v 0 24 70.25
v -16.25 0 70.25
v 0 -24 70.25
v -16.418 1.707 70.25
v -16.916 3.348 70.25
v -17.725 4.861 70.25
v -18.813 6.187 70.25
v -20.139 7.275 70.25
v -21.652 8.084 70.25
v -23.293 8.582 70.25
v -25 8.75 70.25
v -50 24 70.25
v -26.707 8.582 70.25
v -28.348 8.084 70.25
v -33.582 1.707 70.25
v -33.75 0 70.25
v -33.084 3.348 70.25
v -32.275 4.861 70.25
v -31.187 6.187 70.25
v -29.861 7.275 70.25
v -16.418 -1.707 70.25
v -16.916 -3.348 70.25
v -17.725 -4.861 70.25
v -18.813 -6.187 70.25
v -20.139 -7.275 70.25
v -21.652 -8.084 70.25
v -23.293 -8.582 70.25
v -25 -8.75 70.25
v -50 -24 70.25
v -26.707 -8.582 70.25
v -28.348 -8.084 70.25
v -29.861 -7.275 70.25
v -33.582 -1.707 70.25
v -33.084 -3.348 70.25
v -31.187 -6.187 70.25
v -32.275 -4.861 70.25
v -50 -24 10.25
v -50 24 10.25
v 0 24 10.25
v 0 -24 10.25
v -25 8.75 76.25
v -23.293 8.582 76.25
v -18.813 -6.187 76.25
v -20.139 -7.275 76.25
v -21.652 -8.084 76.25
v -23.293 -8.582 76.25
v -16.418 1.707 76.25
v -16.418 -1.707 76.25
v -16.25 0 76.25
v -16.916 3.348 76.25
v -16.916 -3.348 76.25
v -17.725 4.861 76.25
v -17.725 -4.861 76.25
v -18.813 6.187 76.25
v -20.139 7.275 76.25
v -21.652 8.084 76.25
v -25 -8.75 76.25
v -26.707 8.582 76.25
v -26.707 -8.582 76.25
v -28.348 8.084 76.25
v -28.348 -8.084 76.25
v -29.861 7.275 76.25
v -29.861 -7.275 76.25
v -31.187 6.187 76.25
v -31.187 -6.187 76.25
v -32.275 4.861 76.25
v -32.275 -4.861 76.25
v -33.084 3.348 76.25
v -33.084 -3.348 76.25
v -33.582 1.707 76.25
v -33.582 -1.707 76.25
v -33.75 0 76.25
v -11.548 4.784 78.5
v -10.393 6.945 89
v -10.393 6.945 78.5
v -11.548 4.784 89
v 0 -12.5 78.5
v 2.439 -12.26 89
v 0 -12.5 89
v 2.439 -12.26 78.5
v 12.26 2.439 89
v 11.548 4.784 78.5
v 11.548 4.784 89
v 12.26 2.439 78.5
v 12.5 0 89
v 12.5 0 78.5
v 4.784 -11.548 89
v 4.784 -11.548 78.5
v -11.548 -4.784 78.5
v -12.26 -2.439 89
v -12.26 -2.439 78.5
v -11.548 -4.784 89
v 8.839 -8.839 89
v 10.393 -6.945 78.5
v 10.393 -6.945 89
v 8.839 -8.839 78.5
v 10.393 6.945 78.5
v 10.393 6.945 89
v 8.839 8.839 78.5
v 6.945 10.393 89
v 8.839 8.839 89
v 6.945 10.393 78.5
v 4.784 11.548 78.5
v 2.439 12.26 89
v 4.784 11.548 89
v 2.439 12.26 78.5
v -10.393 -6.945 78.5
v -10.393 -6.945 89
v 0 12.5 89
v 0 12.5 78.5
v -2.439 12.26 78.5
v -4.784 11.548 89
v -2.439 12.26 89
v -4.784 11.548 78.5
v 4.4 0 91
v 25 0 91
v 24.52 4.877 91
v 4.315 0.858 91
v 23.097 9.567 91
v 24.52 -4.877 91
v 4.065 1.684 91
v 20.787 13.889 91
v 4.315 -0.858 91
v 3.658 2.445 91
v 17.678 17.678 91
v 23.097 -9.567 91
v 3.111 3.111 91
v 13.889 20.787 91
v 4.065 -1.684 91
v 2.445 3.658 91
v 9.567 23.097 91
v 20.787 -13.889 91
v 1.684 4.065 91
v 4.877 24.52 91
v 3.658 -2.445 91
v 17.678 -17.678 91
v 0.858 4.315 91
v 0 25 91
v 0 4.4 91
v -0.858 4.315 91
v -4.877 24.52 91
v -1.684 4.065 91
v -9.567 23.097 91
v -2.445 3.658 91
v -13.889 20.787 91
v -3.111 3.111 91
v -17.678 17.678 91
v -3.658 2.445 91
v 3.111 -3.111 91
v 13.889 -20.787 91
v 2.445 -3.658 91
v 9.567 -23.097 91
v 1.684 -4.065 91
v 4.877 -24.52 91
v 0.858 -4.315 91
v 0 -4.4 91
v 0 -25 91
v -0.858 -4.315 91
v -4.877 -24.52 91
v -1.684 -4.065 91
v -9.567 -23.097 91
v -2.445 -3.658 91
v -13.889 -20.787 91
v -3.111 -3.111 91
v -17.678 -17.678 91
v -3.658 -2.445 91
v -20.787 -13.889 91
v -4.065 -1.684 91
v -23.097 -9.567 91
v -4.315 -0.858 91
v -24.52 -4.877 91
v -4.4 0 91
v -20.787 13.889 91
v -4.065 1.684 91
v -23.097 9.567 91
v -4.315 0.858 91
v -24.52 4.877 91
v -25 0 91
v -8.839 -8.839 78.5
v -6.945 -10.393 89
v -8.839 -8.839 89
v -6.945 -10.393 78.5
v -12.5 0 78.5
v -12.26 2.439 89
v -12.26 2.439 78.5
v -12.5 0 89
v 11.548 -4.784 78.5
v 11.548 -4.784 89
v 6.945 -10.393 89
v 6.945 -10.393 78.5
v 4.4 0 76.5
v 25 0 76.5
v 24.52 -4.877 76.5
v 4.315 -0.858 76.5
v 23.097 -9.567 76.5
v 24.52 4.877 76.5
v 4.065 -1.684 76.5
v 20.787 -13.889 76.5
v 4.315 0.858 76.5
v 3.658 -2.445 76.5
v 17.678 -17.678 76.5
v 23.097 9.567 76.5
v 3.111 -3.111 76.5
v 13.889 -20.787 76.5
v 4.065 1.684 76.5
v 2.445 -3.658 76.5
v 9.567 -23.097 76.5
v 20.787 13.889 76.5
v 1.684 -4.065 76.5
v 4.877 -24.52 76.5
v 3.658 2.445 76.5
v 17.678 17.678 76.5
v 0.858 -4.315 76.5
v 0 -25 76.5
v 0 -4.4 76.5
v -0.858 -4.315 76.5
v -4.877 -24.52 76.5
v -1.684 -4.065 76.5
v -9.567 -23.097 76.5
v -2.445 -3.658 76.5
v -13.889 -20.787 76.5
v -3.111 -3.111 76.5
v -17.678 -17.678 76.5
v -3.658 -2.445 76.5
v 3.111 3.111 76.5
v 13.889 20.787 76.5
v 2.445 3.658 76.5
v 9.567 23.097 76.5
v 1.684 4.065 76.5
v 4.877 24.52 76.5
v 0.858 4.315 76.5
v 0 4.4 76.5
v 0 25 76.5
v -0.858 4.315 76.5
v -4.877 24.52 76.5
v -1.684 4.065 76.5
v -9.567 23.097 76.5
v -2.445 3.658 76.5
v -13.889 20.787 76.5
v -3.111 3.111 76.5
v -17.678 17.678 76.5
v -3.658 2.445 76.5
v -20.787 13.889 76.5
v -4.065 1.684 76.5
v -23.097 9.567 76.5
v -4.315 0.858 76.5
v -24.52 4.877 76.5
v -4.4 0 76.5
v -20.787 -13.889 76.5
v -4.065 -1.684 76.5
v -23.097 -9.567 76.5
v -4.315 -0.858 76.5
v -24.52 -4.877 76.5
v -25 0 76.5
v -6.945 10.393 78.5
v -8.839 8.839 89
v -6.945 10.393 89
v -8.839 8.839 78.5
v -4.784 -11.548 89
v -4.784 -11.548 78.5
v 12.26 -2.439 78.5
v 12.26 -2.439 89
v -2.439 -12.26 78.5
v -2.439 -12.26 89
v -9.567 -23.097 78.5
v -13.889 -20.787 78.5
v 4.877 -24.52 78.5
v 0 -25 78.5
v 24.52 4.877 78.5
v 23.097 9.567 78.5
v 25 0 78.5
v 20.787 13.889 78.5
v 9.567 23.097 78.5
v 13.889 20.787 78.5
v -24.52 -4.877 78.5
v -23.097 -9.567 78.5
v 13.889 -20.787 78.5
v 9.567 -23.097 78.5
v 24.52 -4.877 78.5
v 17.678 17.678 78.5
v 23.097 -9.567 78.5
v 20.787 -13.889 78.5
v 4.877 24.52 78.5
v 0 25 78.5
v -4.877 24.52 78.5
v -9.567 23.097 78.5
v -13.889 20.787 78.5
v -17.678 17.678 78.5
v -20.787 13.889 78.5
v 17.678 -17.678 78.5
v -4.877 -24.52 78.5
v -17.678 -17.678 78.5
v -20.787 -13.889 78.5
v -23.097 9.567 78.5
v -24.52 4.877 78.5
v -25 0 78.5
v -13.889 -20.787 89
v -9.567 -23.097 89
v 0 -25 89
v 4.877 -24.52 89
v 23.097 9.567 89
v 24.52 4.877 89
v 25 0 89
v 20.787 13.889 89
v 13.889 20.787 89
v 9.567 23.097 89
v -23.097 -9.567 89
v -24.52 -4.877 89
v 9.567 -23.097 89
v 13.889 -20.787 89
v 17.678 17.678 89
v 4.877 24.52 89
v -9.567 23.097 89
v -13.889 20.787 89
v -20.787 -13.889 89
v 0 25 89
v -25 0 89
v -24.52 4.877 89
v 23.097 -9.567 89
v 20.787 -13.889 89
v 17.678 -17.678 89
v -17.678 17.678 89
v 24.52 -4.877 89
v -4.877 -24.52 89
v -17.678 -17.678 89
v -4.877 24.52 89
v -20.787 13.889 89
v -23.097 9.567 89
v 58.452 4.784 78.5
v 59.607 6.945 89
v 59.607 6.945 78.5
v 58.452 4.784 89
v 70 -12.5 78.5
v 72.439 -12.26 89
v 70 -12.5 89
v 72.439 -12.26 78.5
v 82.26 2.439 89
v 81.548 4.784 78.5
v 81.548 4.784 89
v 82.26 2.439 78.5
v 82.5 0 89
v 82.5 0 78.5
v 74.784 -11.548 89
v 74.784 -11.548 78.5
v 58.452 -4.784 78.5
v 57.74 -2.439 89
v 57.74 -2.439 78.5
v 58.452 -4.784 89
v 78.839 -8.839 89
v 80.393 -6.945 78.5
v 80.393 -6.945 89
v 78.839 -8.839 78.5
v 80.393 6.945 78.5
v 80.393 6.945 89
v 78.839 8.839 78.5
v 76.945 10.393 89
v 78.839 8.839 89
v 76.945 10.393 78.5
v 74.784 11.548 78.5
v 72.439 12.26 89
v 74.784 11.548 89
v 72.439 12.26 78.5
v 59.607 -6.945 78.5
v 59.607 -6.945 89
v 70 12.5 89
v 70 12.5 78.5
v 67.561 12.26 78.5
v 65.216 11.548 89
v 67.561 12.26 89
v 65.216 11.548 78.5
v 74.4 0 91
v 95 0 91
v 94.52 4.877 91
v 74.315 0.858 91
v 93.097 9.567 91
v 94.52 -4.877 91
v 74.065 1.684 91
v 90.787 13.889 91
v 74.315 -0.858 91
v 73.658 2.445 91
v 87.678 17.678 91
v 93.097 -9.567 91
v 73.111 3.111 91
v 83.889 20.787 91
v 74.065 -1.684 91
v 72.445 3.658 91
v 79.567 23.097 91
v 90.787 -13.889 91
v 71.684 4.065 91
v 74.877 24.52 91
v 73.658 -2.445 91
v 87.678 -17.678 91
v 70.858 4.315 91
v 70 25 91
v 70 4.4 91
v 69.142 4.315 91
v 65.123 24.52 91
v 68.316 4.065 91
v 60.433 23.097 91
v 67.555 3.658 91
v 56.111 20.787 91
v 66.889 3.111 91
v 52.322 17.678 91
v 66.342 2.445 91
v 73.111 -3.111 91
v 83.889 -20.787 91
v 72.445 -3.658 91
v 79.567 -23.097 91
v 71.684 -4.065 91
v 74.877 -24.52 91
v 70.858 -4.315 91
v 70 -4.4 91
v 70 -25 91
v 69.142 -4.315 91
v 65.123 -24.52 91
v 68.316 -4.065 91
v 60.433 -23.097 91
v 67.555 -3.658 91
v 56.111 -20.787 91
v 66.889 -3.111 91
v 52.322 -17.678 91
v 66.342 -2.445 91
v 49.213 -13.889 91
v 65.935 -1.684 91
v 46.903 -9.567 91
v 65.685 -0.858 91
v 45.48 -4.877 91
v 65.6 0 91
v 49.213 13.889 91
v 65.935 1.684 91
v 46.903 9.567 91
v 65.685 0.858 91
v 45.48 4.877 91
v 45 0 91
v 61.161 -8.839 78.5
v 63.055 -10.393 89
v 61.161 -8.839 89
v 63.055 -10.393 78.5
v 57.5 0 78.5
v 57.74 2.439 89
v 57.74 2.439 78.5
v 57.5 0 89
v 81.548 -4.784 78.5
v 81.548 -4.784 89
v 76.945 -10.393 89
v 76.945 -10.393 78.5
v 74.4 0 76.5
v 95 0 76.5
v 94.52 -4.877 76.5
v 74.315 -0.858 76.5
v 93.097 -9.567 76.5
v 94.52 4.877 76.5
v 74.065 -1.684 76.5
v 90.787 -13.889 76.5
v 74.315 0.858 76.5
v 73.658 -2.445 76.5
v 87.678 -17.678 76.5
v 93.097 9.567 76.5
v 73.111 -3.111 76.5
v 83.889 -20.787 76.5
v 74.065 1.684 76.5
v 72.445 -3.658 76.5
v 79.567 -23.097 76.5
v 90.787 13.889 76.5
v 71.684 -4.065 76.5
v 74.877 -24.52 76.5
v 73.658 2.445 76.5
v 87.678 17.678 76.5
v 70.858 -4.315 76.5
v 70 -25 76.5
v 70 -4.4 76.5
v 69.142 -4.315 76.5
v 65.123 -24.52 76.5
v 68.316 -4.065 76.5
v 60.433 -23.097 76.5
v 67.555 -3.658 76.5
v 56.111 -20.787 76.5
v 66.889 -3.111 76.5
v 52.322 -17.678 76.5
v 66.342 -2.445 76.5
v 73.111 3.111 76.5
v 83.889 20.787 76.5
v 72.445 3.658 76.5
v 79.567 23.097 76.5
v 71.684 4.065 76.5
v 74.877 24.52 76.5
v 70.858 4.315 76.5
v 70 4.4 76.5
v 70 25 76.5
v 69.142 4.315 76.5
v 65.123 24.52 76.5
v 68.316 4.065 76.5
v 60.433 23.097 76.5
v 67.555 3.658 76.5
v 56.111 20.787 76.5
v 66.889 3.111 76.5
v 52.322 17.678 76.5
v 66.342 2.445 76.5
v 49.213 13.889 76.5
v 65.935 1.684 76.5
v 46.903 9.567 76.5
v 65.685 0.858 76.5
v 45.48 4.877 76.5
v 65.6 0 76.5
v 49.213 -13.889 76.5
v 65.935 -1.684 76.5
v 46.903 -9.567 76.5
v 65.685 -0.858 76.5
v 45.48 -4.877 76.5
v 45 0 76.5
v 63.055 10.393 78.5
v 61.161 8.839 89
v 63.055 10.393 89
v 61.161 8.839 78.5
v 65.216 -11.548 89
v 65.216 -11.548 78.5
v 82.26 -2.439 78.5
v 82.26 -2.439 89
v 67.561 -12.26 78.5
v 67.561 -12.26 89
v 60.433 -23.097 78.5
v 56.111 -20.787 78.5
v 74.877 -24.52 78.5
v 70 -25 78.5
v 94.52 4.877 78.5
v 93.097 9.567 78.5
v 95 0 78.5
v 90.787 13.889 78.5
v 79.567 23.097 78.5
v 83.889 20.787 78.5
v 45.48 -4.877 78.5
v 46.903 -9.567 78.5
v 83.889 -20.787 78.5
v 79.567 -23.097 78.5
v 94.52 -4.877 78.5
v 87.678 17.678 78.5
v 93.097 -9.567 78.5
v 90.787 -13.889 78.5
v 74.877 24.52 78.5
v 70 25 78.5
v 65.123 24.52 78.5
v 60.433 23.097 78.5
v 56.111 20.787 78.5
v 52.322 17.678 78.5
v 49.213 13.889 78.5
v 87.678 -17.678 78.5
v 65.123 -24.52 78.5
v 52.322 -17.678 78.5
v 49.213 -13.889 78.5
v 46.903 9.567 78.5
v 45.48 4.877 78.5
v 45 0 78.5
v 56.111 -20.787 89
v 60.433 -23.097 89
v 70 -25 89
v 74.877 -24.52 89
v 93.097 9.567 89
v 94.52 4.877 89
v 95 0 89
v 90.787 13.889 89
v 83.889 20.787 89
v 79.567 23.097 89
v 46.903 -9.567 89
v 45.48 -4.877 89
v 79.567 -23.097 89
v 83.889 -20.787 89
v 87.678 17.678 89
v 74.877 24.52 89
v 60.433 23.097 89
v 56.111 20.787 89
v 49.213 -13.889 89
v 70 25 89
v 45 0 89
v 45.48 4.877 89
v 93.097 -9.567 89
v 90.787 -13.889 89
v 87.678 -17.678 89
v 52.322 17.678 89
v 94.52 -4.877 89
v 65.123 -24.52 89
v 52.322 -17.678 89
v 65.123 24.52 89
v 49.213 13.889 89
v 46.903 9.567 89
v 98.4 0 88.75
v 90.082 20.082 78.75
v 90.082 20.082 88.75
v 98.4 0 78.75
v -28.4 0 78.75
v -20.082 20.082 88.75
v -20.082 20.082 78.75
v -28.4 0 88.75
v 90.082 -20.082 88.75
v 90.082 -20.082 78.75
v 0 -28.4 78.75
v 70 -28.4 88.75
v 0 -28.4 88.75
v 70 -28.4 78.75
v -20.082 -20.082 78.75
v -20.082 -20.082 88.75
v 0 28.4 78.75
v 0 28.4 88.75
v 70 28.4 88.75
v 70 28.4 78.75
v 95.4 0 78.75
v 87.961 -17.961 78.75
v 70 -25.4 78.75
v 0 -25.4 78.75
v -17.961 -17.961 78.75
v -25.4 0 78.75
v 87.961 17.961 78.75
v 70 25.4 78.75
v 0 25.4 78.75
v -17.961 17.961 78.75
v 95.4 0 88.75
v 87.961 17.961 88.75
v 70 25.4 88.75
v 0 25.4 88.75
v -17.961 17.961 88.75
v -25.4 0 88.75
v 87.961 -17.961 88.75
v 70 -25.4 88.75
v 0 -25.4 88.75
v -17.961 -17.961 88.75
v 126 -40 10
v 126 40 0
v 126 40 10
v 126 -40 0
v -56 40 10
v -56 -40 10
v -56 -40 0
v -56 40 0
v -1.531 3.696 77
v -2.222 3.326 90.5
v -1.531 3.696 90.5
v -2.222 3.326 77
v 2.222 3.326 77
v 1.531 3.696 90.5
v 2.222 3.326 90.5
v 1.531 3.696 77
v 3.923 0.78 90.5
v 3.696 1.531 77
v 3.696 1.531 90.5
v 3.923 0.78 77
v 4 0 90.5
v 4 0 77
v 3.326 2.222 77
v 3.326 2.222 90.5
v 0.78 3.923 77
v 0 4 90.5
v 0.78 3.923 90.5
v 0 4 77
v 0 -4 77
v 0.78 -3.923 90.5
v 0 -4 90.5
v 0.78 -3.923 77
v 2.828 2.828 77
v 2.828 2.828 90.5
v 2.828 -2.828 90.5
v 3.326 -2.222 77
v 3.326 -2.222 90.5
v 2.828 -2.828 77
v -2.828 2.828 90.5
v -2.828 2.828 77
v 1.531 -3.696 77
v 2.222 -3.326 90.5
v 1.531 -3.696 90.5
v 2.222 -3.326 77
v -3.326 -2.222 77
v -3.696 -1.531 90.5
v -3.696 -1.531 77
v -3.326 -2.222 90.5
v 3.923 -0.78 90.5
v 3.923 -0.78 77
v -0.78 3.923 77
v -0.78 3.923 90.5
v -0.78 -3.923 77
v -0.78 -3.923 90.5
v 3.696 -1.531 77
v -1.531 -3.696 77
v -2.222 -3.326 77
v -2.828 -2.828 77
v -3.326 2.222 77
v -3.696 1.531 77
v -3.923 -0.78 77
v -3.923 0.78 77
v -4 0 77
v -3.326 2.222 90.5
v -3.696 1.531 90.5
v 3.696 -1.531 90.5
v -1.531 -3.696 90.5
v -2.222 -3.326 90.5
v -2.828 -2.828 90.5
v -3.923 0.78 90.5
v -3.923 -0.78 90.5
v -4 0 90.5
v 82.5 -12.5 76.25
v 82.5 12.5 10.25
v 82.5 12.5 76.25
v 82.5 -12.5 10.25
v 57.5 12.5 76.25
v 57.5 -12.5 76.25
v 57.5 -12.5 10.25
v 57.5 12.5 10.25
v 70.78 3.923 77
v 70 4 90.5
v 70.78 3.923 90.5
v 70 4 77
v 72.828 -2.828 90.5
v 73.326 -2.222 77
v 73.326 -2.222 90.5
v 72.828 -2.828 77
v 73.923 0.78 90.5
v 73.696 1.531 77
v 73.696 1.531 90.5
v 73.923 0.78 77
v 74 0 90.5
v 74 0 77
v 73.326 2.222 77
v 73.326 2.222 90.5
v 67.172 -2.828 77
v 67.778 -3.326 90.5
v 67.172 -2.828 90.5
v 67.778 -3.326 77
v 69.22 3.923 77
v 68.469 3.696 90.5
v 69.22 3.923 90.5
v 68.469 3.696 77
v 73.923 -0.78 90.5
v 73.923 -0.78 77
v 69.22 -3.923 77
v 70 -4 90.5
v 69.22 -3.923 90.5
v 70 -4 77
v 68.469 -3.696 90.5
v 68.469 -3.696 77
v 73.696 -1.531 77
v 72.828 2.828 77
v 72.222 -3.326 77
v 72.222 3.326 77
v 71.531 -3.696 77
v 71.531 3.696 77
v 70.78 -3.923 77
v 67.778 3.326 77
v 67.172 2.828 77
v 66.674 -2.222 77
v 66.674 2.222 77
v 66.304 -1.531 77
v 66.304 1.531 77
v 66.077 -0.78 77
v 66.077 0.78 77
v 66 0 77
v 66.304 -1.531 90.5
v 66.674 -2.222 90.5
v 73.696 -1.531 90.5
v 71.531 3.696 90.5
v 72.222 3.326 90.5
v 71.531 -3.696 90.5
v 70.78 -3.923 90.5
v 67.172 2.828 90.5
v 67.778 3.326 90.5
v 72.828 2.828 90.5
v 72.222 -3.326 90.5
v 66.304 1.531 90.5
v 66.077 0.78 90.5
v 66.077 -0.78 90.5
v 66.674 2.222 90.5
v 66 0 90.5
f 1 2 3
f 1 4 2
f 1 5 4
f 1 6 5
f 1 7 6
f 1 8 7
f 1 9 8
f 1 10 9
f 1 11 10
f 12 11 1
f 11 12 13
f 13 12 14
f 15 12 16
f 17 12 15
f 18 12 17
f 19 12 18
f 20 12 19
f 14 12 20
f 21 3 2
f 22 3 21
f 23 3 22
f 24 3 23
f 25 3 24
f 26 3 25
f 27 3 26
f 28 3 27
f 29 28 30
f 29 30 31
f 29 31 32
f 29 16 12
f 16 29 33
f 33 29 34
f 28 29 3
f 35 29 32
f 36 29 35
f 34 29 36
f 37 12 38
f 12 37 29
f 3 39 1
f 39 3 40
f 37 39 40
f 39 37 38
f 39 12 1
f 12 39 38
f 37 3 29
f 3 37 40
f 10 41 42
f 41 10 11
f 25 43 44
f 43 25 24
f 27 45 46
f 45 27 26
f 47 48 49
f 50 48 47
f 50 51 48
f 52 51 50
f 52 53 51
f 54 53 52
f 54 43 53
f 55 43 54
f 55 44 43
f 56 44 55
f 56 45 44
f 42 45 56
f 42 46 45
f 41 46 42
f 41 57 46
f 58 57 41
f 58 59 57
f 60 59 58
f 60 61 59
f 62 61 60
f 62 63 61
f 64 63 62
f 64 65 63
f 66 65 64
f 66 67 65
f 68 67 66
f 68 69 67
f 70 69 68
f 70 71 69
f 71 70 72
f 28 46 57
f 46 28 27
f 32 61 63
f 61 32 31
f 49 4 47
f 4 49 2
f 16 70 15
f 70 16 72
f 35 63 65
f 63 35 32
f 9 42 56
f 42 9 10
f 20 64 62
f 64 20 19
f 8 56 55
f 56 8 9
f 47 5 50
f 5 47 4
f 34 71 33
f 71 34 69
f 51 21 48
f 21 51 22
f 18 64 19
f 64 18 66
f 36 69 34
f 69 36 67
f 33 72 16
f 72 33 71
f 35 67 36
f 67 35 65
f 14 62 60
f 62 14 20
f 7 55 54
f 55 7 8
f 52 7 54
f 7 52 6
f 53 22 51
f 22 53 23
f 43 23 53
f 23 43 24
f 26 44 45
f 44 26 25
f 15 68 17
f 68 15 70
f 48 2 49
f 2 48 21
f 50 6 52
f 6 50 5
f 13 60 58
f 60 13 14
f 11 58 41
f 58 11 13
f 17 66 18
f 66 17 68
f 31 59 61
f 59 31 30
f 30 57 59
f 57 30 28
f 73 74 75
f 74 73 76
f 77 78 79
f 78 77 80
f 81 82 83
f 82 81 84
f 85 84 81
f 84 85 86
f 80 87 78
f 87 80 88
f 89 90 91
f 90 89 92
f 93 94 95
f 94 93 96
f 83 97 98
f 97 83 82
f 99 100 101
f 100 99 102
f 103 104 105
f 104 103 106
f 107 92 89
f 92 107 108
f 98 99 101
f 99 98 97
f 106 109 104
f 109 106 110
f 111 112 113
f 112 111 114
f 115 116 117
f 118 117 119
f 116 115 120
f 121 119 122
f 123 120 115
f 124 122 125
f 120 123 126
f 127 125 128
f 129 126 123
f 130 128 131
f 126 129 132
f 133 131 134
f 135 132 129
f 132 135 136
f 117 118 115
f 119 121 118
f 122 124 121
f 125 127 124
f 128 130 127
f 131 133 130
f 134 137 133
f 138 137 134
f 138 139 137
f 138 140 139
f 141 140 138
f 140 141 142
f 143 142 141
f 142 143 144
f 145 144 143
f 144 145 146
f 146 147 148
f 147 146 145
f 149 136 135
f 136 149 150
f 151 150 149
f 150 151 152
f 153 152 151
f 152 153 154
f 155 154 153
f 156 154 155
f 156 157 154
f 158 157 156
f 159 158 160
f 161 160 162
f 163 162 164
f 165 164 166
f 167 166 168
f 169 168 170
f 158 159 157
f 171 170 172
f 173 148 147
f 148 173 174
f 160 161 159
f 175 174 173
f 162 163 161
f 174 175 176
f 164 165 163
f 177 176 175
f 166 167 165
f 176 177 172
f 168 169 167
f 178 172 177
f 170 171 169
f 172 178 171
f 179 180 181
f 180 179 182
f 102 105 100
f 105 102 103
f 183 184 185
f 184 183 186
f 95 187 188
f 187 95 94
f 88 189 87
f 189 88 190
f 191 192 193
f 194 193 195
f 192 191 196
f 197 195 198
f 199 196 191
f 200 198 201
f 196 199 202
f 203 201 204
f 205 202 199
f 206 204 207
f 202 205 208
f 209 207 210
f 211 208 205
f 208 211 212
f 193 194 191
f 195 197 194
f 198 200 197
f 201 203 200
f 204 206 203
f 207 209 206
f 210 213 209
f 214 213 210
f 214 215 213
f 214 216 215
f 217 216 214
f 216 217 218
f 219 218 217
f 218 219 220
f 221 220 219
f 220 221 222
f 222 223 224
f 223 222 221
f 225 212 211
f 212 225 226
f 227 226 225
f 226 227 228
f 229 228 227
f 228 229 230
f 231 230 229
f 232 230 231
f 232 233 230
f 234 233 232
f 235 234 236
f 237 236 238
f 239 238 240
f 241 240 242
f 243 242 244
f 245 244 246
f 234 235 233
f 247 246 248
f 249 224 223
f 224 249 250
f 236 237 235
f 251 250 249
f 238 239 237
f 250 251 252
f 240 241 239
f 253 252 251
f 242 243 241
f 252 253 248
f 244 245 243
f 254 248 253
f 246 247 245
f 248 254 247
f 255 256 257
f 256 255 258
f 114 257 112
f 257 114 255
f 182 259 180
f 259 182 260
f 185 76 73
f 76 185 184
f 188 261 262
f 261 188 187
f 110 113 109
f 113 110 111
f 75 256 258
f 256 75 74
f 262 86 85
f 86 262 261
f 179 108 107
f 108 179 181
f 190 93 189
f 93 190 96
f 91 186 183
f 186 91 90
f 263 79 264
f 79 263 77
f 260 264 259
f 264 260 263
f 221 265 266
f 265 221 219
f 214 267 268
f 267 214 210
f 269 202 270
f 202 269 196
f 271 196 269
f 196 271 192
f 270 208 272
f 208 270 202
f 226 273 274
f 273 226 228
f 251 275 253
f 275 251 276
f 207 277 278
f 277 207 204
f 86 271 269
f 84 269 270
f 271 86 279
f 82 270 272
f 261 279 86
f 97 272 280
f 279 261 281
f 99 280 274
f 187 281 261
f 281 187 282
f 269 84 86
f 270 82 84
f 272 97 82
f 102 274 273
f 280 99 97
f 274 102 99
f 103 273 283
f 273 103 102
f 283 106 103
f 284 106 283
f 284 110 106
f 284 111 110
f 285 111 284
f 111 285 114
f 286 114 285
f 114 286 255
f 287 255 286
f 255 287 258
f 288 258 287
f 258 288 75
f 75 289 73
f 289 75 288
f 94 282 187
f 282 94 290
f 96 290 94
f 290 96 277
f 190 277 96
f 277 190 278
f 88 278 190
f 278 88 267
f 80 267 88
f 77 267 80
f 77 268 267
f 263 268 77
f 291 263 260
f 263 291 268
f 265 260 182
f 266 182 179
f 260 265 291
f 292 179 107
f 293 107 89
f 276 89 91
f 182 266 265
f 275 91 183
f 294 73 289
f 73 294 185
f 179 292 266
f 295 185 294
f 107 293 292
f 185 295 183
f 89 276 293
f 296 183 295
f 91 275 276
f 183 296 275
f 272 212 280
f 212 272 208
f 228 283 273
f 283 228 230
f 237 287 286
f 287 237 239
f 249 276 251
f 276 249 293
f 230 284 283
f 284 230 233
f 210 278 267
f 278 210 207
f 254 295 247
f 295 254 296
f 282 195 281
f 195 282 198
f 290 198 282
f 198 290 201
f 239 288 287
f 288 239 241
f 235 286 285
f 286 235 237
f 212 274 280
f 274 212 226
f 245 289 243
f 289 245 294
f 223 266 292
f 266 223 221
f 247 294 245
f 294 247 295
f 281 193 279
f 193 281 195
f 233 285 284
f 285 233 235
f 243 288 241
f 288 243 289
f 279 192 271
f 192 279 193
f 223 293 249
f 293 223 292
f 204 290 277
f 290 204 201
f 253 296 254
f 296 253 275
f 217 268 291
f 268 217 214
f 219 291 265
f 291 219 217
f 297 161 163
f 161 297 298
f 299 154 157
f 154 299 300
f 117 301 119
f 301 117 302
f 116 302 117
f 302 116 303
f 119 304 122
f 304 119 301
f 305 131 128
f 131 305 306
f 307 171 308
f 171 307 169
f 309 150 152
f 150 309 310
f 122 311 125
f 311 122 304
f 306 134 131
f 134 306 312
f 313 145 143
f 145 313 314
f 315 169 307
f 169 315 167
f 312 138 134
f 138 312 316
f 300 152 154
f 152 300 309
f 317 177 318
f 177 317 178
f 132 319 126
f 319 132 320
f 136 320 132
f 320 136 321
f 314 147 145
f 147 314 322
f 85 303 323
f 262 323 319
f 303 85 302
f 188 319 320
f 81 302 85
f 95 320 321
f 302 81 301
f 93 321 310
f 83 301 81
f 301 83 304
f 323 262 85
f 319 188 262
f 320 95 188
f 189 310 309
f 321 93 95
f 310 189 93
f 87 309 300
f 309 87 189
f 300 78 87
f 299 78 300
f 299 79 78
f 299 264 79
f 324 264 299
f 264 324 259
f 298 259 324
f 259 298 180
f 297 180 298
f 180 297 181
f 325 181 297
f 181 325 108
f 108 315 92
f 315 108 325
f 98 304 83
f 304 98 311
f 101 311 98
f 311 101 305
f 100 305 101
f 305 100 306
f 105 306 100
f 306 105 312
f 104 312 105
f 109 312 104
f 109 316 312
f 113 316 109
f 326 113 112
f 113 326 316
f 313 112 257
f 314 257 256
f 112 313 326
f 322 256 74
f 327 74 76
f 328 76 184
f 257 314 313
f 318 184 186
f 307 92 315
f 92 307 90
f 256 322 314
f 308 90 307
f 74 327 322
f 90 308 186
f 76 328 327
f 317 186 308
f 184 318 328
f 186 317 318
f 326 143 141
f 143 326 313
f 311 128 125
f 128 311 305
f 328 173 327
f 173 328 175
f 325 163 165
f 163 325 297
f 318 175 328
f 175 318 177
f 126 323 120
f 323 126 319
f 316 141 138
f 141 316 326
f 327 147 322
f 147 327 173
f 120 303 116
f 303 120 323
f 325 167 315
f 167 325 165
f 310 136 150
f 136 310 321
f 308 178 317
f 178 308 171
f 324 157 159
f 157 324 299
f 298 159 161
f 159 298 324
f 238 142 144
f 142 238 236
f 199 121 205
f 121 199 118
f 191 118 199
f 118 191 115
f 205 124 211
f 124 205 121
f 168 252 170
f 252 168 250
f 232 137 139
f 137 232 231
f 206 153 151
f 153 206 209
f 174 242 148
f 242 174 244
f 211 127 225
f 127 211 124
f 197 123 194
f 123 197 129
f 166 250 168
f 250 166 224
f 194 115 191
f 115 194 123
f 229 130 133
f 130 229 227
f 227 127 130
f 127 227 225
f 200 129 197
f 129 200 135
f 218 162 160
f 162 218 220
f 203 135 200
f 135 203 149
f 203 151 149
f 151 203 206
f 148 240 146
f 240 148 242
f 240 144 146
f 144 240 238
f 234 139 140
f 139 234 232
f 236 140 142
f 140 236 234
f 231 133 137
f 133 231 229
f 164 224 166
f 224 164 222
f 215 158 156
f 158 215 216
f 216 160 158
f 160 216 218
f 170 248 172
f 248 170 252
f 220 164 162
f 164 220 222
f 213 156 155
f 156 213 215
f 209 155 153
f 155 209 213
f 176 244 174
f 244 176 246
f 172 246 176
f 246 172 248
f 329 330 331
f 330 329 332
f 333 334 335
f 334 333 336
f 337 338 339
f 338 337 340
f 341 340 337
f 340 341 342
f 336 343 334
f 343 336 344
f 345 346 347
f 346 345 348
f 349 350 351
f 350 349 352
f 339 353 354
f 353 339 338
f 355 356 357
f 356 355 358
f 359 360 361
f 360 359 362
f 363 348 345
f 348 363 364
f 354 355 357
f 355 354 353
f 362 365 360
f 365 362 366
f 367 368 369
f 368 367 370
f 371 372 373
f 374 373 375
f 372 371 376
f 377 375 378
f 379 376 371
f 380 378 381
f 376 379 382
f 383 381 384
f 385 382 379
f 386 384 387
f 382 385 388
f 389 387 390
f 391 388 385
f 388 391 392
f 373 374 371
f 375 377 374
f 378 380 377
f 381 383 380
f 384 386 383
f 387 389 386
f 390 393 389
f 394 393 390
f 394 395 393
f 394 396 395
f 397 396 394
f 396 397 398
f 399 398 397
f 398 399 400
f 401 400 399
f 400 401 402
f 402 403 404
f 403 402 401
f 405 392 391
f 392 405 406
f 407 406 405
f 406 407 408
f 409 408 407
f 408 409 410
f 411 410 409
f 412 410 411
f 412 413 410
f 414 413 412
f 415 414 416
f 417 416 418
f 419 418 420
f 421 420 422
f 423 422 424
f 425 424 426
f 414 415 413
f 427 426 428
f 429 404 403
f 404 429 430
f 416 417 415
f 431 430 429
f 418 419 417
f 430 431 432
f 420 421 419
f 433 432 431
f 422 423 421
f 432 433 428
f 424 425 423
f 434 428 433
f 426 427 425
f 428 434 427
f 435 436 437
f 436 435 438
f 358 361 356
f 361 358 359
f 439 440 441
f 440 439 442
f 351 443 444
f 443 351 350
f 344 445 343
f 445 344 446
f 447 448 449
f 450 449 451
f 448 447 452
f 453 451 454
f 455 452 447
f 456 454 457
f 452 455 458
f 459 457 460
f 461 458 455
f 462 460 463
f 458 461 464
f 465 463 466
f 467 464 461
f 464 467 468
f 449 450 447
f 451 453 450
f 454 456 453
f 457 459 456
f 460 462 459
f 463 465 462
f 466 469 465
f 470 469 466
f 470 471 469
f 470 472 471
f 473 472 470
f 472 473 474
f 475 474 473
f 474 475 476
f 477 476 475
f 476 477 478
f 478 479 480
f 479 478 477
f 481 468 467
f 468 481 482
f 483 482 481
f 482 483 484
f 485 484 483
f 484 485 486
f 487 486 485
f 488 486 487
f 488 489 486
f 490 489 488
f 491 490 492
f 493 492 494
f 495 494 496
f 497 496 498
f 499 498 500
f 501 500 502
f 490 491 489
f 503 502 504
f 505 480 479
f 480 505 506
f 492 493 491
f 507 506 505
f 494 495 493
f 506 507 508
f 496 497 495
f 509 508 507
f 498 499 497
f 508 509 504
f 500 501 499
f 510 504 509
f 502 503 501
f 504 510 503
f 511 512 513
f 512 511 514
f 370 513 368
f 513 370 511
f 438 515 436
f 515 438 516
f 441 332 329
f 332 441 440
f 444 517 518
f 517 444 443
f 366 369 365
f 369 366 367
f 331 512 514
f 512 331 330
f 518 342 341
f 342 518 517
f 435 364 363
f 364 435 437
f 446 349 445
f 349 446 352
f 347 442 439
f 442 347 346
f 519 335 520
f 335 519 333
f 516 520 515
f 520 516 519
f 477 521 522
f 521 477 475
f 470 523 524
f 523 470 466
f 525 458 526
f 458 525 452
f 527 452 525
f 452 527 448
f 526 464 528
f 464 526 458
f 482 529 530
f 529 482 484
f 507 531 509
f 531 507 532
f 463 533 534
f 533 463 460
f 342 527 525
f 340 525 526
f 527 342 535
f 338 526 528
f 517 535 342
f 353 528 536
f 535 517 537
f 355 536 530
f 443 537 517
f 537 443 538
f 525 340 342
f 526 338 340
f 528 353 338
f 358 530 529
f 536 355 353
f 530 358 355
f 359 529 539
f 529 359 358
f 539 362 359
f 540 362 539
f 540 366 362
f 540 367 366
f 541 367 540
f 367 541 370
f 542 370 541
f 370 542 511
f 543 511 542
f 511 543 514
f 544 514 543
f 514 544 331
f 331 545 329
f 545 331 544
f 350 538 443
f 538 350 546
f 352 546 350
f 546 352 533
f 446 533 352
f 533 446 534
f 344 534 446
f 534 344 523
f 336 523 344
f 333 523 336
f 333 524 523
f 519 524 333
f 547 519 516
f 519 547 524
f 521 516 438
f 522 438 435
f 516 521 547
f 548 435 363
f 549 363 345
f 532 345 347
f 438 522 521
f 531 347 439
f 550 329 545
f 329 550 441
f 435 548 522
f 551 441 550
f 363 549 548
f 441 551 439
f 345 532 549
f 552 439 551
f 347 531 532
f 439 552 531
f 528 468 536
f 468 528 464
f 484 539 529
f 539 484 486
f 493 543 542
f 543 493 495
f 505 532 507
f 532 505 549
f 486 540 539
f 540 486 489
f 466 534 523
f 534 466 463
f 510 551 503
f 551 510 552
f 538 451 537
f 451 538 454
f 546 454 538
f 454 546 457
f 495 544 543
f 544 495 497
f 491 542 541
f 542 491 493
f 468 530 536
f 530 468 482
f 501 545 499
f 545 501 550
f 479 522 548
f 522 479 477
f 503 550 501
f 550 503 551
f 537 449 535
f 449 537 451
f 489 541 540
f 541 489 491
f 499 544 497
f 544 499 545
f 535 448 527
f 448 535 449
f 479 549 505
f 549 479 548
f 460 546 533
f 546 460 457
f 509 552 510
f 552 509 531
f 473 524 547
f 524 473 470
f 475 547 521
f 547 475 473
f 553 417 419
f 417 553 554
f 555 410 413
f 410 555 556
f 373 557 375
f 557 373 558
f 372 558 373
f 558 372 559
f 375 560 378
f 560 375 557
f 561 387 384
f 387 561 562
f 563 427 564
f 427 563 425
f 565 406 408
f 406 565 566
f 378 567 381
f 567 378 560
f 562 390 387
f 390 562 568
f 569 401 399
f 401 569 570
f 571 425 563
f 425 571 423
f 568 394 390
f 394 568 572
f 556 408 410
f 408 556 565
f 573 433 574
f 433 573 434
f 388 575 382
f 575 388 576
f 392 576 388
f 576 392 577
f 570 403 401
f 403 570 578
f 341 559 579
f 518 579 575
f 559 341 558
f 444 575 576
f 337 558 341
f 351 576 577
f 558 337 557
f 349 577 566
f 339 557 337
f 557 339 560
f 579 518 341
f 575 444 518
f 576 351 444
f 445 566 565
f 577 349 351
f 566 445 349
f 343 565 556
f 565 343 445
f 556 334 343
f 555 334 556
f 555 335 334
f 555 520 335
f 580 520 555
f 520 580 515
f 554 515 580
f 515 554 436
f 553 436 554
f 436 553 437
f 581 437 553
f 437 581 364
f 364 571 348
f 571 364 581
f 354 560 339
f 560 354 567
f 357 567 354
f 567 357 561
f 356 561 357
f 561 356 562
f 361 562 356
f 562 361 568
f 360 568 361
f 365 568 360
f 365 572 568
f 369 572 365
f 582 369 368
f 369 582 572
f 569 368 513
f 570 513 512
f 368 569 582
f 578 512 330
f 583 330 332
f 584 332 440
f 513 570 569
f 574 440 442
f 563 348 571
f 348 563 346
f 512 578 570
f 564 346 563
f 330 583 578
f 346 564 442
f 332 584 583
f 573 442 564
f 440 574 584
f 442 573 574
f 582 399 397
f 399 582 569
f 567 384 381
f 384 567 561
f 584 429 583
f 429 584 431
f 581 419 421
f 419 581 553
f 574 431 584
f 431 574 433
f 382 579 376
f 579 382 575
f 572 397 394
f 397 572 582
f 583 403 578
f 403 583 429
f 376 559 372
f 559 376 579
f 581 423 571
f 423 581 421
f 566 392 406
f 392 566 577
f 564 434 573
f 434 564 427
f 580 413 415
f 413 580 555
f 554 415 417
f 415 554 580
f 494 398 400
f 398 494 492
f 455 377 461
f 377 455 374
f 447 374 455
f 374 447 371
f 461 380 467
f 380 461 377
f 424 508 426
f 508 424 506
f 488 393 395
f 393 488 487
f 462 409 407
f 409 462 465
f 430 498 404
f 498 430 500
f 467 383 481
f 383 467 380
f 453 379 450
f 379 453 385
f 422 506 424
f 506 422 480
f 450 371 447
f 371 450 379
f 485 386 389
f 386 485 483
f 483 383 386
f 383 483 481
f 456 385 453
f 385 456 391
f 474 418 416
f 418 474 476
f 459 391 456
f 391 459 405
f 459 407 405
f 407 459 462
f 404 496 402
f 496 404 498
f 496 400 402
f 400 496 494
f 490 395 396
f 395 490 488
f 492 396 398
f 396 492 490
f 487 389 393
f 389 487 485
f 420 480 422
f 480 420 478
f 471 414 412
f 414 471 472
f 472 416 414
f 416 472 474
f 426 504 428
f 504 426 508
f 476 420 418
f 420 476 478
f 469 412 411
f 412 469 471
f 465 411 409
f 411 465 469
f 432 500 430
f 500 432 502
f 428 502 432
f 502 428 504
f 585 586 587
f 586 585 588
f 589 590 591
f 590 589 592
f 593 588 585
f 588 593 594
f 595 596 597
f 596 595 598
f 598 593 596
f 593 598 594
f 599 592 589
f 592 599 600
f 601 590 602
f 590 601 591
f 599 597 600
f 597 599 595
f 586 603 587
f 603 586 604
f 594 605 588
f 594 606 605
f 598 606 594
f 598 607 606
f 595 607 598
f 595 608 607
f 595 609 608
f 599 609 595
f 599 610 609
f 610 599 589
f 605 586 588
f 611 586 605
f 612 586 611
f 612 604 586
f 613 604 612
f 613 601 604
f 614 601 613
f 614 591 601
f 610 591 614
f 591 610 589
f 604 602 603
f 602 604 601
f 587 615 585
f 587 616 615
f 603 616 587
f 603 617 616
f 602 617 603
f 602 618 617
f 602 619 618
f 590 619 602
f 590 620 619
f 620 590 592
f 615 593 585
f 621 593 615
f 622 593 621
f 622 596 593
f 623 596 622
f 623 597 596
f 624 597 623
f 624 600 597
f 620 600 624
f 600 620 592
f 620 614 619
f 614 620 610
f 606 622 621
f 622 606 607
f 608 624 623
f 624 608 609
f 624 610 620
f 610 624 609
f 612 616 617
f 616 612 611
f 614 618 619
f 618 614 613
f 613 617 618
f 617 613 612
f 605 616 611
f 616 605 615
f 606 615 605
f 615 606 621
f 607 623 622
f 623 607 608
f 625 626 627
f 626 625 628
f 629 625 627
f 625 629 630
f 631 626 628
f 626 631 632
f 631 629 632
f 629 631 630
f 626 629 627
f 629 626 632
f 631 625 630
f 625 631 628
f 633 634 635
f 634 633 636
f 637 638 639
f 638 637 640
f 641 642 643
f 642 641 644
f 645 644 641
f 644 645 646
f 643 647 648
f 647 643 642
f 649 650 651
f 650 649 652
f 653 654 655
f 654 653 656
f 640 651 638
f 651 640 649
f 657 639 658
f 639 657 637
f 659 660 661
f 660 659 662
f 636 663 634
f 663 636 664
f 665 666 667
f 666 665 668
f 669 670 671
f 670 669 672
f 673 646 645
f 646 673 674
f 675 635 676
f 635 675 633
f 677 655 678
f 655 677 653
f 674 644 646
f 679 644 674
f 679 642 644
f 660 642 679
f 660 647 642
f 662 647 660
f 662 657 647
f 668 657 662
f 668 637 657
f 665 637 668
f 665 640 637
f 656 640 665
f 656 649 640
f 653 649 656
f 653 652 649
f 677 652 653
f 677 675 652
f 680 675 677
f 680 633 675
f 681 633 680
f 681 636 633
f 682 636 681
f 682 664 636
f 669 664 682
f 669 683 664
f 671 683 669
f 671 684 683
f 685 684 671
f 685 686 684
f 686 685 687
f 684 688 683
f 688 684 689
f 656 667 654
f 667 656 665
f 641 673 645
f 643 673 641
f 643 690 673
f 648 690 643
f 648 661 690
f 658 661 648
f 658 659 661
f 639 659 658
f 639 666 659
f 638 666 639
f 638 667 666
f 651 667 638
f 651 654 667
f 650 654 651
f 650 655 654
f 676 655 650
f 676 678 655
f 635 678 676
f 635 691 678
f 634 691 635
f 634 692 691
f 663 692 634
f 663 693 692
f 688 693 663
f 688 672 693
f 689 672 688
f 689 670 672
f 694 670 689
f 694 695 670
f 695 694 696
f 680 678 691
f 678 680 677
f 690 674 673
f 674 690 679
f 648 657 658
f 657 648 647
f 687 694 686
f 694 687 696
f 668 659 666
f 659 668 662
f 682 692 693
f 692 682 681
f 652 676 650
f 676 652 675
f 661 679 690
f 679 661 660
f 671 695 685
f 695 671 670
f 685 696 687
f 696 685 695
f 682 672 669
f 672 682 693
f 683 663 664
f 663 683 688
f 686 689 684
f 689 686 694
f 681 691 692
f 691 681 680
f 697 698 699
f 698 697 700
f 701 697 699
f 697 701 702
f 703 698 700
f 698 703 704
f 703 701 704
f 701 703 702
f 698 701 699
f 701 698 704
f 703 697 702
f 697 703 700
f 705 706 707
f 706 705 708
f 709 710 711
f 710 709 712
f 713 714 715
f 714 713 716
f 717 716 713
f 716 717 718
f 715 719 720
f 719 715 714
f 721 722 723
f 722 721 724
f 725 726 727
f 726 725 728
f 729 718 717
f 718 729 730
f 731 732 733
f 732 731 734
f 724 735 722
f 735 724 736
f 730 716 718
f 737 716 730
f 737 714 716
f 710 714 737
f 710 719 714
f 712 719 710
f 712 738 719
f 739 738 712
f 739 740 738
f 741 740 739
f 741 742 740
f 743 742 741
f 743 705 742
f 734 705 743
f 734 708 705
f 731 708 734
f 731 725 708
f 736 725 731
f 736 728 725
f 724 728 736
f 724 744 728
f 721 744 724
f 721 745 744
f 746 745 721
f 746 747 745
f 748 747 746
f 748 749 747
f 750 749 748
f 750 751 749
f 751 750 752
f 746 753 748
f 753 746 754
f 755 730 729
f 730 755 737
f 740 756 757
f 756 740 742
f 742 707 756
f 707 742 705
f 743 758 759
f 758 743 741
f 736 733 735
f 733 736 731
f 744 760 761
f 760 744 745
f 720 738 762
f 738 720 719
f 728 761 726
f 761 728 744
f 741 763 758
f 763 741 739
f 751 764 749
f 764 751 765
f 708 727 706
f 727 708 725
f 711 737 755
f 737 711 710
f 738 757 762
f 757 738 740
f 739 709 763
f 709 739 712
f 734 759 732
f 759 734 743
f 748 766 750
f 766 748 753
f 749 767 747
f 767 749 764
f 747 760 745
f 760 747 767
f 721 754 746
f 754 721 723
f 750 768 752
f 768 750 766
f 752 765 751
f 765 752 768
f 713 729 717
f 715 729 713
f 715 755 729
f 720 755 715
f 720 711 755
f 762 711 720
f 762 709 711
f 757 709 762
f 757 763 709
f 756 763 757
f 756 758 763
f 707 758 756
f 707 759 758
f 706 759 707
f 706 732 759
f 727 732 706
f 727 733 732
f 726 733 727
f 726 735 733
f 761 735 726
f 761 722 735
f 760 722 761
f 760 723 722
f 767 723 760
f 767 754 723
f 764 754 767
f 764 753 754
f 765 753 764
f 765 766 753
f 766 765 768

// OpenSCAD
$fn = 32;

// ------------------------------------------------------------------------
// Motor belt drive: span 70 mm, pulleys d50, belt 10 mm wide
// Every part is its own module, assembly() places every instance.
// ------------------------------------------------------------------------

// --- part 1 ---
module base_plate() {
  difference() {
    translate([-91, -40, 0]) cube([182, 80, 10]);
  }
}

// --- part 2 ---
module motor() {
  union() {
    translate([-30, -24, 0]) cube([60, 48, 50]);
    translate([33, 0, 25]) rotate([0, 90, 0]) cylinder(h = 6, d = 17.5, center = true);
  }
}

// --- part 3 ---
module drive_shaft() {
  translate([0, 0, -6.75]) cylinder(h = 13.5, d = 8);
}

// --- part 4 ---
module pulley_drive() {
  difference() {
    union() {
      cylinder(h = 14.5, d = 25);
      cylinder(h = 2, d = 50);
      translate([0, 0, 12.5]) cylinder(h = 2, d = 50);
    }
    translate([0, 0, -1]) cylinder(h = 16.5, d = 8.8);
  }
}

// --- part 5 ---
module idler_post() {
  translate([-12.5, -12.5, 0]) cube([25, 25, 66]);
}

// --- part 6 ---
module driven_shaft() {
  translate([0, 0, -6.75]) cylinder(h = 13.5, d = 8);
}

// --- part 7 ---
module pulley_driven() {
  difference() {
    union() {
      cylinder(h = 14.5, d = 25);
      cylinder(h = 2, d = 50);
      translate([0, 0, 12.5]) cylinder(h = 2, d = 50);
    }
    translate([0, 0, -1]) cylinder(h = 16.5, d = 8.8);
  }
}

// --- part 8 ---
module drive_belt() {
  difference() {
    linear_extrude(height = 10) polygon(points = concat([for (a = [90 : 45 : 270]) [28.4 * cos(a), 28.4 * sin(a)]], [for (a = [270 : 45 : 450]) [70 + 28.4 * cos(a), 28.4 * sin(a)]]));
    translate([0, 0, -1]) linear_extrude(height = 12) polygon(points = concat([for (a = [90 : 45 : 270]) [25.4 * cos(a), 25.4 * sin(a)]], [for (a = [270 : 45 : 450]) [70 + 25.4 * cos(a), 25.4 * sin(a)]]));
  }
}

// --- assembly ---
module assembly() {
  color([0.80, 0.24, 0.20]) translate([35, 0, 0]) rotate([0, 0, 0]) base_plate();
  color([0.20, 0.45, 0.75]) translate([0, 0, 40.25]) rotate([0, 270, 0]) motor();
  color([0.25, 0.62, 0.32]) translate([0, 0, 83.75]) rotate([0, 0, 0]) drive_shaft();
  color([0.92, 0.70, 0.18]) translate([0, 0, 76.5]) rotate([0, 0, 0]) pulley_drive();
  color([0.58, 0.35, 0.70]) translate([70, 0, 10.25]) rotate([0, 0, 0]) idler_post();
  color([0.16, 0.66, 0.66]) translate([70, 0, 83.75]) rotate([0, 0, 0]) driven_shaft();
  color([0.85, 0.48, 0.18]) translate([70, 0, 76.5]) rotate([0, 0, 0]) pulley_driven();
  color([0.55, 0.60, 0.65]) translate([0, 0, 78.75]) rotate([0, 0, 0]) drive_belt();
}

assembly();
